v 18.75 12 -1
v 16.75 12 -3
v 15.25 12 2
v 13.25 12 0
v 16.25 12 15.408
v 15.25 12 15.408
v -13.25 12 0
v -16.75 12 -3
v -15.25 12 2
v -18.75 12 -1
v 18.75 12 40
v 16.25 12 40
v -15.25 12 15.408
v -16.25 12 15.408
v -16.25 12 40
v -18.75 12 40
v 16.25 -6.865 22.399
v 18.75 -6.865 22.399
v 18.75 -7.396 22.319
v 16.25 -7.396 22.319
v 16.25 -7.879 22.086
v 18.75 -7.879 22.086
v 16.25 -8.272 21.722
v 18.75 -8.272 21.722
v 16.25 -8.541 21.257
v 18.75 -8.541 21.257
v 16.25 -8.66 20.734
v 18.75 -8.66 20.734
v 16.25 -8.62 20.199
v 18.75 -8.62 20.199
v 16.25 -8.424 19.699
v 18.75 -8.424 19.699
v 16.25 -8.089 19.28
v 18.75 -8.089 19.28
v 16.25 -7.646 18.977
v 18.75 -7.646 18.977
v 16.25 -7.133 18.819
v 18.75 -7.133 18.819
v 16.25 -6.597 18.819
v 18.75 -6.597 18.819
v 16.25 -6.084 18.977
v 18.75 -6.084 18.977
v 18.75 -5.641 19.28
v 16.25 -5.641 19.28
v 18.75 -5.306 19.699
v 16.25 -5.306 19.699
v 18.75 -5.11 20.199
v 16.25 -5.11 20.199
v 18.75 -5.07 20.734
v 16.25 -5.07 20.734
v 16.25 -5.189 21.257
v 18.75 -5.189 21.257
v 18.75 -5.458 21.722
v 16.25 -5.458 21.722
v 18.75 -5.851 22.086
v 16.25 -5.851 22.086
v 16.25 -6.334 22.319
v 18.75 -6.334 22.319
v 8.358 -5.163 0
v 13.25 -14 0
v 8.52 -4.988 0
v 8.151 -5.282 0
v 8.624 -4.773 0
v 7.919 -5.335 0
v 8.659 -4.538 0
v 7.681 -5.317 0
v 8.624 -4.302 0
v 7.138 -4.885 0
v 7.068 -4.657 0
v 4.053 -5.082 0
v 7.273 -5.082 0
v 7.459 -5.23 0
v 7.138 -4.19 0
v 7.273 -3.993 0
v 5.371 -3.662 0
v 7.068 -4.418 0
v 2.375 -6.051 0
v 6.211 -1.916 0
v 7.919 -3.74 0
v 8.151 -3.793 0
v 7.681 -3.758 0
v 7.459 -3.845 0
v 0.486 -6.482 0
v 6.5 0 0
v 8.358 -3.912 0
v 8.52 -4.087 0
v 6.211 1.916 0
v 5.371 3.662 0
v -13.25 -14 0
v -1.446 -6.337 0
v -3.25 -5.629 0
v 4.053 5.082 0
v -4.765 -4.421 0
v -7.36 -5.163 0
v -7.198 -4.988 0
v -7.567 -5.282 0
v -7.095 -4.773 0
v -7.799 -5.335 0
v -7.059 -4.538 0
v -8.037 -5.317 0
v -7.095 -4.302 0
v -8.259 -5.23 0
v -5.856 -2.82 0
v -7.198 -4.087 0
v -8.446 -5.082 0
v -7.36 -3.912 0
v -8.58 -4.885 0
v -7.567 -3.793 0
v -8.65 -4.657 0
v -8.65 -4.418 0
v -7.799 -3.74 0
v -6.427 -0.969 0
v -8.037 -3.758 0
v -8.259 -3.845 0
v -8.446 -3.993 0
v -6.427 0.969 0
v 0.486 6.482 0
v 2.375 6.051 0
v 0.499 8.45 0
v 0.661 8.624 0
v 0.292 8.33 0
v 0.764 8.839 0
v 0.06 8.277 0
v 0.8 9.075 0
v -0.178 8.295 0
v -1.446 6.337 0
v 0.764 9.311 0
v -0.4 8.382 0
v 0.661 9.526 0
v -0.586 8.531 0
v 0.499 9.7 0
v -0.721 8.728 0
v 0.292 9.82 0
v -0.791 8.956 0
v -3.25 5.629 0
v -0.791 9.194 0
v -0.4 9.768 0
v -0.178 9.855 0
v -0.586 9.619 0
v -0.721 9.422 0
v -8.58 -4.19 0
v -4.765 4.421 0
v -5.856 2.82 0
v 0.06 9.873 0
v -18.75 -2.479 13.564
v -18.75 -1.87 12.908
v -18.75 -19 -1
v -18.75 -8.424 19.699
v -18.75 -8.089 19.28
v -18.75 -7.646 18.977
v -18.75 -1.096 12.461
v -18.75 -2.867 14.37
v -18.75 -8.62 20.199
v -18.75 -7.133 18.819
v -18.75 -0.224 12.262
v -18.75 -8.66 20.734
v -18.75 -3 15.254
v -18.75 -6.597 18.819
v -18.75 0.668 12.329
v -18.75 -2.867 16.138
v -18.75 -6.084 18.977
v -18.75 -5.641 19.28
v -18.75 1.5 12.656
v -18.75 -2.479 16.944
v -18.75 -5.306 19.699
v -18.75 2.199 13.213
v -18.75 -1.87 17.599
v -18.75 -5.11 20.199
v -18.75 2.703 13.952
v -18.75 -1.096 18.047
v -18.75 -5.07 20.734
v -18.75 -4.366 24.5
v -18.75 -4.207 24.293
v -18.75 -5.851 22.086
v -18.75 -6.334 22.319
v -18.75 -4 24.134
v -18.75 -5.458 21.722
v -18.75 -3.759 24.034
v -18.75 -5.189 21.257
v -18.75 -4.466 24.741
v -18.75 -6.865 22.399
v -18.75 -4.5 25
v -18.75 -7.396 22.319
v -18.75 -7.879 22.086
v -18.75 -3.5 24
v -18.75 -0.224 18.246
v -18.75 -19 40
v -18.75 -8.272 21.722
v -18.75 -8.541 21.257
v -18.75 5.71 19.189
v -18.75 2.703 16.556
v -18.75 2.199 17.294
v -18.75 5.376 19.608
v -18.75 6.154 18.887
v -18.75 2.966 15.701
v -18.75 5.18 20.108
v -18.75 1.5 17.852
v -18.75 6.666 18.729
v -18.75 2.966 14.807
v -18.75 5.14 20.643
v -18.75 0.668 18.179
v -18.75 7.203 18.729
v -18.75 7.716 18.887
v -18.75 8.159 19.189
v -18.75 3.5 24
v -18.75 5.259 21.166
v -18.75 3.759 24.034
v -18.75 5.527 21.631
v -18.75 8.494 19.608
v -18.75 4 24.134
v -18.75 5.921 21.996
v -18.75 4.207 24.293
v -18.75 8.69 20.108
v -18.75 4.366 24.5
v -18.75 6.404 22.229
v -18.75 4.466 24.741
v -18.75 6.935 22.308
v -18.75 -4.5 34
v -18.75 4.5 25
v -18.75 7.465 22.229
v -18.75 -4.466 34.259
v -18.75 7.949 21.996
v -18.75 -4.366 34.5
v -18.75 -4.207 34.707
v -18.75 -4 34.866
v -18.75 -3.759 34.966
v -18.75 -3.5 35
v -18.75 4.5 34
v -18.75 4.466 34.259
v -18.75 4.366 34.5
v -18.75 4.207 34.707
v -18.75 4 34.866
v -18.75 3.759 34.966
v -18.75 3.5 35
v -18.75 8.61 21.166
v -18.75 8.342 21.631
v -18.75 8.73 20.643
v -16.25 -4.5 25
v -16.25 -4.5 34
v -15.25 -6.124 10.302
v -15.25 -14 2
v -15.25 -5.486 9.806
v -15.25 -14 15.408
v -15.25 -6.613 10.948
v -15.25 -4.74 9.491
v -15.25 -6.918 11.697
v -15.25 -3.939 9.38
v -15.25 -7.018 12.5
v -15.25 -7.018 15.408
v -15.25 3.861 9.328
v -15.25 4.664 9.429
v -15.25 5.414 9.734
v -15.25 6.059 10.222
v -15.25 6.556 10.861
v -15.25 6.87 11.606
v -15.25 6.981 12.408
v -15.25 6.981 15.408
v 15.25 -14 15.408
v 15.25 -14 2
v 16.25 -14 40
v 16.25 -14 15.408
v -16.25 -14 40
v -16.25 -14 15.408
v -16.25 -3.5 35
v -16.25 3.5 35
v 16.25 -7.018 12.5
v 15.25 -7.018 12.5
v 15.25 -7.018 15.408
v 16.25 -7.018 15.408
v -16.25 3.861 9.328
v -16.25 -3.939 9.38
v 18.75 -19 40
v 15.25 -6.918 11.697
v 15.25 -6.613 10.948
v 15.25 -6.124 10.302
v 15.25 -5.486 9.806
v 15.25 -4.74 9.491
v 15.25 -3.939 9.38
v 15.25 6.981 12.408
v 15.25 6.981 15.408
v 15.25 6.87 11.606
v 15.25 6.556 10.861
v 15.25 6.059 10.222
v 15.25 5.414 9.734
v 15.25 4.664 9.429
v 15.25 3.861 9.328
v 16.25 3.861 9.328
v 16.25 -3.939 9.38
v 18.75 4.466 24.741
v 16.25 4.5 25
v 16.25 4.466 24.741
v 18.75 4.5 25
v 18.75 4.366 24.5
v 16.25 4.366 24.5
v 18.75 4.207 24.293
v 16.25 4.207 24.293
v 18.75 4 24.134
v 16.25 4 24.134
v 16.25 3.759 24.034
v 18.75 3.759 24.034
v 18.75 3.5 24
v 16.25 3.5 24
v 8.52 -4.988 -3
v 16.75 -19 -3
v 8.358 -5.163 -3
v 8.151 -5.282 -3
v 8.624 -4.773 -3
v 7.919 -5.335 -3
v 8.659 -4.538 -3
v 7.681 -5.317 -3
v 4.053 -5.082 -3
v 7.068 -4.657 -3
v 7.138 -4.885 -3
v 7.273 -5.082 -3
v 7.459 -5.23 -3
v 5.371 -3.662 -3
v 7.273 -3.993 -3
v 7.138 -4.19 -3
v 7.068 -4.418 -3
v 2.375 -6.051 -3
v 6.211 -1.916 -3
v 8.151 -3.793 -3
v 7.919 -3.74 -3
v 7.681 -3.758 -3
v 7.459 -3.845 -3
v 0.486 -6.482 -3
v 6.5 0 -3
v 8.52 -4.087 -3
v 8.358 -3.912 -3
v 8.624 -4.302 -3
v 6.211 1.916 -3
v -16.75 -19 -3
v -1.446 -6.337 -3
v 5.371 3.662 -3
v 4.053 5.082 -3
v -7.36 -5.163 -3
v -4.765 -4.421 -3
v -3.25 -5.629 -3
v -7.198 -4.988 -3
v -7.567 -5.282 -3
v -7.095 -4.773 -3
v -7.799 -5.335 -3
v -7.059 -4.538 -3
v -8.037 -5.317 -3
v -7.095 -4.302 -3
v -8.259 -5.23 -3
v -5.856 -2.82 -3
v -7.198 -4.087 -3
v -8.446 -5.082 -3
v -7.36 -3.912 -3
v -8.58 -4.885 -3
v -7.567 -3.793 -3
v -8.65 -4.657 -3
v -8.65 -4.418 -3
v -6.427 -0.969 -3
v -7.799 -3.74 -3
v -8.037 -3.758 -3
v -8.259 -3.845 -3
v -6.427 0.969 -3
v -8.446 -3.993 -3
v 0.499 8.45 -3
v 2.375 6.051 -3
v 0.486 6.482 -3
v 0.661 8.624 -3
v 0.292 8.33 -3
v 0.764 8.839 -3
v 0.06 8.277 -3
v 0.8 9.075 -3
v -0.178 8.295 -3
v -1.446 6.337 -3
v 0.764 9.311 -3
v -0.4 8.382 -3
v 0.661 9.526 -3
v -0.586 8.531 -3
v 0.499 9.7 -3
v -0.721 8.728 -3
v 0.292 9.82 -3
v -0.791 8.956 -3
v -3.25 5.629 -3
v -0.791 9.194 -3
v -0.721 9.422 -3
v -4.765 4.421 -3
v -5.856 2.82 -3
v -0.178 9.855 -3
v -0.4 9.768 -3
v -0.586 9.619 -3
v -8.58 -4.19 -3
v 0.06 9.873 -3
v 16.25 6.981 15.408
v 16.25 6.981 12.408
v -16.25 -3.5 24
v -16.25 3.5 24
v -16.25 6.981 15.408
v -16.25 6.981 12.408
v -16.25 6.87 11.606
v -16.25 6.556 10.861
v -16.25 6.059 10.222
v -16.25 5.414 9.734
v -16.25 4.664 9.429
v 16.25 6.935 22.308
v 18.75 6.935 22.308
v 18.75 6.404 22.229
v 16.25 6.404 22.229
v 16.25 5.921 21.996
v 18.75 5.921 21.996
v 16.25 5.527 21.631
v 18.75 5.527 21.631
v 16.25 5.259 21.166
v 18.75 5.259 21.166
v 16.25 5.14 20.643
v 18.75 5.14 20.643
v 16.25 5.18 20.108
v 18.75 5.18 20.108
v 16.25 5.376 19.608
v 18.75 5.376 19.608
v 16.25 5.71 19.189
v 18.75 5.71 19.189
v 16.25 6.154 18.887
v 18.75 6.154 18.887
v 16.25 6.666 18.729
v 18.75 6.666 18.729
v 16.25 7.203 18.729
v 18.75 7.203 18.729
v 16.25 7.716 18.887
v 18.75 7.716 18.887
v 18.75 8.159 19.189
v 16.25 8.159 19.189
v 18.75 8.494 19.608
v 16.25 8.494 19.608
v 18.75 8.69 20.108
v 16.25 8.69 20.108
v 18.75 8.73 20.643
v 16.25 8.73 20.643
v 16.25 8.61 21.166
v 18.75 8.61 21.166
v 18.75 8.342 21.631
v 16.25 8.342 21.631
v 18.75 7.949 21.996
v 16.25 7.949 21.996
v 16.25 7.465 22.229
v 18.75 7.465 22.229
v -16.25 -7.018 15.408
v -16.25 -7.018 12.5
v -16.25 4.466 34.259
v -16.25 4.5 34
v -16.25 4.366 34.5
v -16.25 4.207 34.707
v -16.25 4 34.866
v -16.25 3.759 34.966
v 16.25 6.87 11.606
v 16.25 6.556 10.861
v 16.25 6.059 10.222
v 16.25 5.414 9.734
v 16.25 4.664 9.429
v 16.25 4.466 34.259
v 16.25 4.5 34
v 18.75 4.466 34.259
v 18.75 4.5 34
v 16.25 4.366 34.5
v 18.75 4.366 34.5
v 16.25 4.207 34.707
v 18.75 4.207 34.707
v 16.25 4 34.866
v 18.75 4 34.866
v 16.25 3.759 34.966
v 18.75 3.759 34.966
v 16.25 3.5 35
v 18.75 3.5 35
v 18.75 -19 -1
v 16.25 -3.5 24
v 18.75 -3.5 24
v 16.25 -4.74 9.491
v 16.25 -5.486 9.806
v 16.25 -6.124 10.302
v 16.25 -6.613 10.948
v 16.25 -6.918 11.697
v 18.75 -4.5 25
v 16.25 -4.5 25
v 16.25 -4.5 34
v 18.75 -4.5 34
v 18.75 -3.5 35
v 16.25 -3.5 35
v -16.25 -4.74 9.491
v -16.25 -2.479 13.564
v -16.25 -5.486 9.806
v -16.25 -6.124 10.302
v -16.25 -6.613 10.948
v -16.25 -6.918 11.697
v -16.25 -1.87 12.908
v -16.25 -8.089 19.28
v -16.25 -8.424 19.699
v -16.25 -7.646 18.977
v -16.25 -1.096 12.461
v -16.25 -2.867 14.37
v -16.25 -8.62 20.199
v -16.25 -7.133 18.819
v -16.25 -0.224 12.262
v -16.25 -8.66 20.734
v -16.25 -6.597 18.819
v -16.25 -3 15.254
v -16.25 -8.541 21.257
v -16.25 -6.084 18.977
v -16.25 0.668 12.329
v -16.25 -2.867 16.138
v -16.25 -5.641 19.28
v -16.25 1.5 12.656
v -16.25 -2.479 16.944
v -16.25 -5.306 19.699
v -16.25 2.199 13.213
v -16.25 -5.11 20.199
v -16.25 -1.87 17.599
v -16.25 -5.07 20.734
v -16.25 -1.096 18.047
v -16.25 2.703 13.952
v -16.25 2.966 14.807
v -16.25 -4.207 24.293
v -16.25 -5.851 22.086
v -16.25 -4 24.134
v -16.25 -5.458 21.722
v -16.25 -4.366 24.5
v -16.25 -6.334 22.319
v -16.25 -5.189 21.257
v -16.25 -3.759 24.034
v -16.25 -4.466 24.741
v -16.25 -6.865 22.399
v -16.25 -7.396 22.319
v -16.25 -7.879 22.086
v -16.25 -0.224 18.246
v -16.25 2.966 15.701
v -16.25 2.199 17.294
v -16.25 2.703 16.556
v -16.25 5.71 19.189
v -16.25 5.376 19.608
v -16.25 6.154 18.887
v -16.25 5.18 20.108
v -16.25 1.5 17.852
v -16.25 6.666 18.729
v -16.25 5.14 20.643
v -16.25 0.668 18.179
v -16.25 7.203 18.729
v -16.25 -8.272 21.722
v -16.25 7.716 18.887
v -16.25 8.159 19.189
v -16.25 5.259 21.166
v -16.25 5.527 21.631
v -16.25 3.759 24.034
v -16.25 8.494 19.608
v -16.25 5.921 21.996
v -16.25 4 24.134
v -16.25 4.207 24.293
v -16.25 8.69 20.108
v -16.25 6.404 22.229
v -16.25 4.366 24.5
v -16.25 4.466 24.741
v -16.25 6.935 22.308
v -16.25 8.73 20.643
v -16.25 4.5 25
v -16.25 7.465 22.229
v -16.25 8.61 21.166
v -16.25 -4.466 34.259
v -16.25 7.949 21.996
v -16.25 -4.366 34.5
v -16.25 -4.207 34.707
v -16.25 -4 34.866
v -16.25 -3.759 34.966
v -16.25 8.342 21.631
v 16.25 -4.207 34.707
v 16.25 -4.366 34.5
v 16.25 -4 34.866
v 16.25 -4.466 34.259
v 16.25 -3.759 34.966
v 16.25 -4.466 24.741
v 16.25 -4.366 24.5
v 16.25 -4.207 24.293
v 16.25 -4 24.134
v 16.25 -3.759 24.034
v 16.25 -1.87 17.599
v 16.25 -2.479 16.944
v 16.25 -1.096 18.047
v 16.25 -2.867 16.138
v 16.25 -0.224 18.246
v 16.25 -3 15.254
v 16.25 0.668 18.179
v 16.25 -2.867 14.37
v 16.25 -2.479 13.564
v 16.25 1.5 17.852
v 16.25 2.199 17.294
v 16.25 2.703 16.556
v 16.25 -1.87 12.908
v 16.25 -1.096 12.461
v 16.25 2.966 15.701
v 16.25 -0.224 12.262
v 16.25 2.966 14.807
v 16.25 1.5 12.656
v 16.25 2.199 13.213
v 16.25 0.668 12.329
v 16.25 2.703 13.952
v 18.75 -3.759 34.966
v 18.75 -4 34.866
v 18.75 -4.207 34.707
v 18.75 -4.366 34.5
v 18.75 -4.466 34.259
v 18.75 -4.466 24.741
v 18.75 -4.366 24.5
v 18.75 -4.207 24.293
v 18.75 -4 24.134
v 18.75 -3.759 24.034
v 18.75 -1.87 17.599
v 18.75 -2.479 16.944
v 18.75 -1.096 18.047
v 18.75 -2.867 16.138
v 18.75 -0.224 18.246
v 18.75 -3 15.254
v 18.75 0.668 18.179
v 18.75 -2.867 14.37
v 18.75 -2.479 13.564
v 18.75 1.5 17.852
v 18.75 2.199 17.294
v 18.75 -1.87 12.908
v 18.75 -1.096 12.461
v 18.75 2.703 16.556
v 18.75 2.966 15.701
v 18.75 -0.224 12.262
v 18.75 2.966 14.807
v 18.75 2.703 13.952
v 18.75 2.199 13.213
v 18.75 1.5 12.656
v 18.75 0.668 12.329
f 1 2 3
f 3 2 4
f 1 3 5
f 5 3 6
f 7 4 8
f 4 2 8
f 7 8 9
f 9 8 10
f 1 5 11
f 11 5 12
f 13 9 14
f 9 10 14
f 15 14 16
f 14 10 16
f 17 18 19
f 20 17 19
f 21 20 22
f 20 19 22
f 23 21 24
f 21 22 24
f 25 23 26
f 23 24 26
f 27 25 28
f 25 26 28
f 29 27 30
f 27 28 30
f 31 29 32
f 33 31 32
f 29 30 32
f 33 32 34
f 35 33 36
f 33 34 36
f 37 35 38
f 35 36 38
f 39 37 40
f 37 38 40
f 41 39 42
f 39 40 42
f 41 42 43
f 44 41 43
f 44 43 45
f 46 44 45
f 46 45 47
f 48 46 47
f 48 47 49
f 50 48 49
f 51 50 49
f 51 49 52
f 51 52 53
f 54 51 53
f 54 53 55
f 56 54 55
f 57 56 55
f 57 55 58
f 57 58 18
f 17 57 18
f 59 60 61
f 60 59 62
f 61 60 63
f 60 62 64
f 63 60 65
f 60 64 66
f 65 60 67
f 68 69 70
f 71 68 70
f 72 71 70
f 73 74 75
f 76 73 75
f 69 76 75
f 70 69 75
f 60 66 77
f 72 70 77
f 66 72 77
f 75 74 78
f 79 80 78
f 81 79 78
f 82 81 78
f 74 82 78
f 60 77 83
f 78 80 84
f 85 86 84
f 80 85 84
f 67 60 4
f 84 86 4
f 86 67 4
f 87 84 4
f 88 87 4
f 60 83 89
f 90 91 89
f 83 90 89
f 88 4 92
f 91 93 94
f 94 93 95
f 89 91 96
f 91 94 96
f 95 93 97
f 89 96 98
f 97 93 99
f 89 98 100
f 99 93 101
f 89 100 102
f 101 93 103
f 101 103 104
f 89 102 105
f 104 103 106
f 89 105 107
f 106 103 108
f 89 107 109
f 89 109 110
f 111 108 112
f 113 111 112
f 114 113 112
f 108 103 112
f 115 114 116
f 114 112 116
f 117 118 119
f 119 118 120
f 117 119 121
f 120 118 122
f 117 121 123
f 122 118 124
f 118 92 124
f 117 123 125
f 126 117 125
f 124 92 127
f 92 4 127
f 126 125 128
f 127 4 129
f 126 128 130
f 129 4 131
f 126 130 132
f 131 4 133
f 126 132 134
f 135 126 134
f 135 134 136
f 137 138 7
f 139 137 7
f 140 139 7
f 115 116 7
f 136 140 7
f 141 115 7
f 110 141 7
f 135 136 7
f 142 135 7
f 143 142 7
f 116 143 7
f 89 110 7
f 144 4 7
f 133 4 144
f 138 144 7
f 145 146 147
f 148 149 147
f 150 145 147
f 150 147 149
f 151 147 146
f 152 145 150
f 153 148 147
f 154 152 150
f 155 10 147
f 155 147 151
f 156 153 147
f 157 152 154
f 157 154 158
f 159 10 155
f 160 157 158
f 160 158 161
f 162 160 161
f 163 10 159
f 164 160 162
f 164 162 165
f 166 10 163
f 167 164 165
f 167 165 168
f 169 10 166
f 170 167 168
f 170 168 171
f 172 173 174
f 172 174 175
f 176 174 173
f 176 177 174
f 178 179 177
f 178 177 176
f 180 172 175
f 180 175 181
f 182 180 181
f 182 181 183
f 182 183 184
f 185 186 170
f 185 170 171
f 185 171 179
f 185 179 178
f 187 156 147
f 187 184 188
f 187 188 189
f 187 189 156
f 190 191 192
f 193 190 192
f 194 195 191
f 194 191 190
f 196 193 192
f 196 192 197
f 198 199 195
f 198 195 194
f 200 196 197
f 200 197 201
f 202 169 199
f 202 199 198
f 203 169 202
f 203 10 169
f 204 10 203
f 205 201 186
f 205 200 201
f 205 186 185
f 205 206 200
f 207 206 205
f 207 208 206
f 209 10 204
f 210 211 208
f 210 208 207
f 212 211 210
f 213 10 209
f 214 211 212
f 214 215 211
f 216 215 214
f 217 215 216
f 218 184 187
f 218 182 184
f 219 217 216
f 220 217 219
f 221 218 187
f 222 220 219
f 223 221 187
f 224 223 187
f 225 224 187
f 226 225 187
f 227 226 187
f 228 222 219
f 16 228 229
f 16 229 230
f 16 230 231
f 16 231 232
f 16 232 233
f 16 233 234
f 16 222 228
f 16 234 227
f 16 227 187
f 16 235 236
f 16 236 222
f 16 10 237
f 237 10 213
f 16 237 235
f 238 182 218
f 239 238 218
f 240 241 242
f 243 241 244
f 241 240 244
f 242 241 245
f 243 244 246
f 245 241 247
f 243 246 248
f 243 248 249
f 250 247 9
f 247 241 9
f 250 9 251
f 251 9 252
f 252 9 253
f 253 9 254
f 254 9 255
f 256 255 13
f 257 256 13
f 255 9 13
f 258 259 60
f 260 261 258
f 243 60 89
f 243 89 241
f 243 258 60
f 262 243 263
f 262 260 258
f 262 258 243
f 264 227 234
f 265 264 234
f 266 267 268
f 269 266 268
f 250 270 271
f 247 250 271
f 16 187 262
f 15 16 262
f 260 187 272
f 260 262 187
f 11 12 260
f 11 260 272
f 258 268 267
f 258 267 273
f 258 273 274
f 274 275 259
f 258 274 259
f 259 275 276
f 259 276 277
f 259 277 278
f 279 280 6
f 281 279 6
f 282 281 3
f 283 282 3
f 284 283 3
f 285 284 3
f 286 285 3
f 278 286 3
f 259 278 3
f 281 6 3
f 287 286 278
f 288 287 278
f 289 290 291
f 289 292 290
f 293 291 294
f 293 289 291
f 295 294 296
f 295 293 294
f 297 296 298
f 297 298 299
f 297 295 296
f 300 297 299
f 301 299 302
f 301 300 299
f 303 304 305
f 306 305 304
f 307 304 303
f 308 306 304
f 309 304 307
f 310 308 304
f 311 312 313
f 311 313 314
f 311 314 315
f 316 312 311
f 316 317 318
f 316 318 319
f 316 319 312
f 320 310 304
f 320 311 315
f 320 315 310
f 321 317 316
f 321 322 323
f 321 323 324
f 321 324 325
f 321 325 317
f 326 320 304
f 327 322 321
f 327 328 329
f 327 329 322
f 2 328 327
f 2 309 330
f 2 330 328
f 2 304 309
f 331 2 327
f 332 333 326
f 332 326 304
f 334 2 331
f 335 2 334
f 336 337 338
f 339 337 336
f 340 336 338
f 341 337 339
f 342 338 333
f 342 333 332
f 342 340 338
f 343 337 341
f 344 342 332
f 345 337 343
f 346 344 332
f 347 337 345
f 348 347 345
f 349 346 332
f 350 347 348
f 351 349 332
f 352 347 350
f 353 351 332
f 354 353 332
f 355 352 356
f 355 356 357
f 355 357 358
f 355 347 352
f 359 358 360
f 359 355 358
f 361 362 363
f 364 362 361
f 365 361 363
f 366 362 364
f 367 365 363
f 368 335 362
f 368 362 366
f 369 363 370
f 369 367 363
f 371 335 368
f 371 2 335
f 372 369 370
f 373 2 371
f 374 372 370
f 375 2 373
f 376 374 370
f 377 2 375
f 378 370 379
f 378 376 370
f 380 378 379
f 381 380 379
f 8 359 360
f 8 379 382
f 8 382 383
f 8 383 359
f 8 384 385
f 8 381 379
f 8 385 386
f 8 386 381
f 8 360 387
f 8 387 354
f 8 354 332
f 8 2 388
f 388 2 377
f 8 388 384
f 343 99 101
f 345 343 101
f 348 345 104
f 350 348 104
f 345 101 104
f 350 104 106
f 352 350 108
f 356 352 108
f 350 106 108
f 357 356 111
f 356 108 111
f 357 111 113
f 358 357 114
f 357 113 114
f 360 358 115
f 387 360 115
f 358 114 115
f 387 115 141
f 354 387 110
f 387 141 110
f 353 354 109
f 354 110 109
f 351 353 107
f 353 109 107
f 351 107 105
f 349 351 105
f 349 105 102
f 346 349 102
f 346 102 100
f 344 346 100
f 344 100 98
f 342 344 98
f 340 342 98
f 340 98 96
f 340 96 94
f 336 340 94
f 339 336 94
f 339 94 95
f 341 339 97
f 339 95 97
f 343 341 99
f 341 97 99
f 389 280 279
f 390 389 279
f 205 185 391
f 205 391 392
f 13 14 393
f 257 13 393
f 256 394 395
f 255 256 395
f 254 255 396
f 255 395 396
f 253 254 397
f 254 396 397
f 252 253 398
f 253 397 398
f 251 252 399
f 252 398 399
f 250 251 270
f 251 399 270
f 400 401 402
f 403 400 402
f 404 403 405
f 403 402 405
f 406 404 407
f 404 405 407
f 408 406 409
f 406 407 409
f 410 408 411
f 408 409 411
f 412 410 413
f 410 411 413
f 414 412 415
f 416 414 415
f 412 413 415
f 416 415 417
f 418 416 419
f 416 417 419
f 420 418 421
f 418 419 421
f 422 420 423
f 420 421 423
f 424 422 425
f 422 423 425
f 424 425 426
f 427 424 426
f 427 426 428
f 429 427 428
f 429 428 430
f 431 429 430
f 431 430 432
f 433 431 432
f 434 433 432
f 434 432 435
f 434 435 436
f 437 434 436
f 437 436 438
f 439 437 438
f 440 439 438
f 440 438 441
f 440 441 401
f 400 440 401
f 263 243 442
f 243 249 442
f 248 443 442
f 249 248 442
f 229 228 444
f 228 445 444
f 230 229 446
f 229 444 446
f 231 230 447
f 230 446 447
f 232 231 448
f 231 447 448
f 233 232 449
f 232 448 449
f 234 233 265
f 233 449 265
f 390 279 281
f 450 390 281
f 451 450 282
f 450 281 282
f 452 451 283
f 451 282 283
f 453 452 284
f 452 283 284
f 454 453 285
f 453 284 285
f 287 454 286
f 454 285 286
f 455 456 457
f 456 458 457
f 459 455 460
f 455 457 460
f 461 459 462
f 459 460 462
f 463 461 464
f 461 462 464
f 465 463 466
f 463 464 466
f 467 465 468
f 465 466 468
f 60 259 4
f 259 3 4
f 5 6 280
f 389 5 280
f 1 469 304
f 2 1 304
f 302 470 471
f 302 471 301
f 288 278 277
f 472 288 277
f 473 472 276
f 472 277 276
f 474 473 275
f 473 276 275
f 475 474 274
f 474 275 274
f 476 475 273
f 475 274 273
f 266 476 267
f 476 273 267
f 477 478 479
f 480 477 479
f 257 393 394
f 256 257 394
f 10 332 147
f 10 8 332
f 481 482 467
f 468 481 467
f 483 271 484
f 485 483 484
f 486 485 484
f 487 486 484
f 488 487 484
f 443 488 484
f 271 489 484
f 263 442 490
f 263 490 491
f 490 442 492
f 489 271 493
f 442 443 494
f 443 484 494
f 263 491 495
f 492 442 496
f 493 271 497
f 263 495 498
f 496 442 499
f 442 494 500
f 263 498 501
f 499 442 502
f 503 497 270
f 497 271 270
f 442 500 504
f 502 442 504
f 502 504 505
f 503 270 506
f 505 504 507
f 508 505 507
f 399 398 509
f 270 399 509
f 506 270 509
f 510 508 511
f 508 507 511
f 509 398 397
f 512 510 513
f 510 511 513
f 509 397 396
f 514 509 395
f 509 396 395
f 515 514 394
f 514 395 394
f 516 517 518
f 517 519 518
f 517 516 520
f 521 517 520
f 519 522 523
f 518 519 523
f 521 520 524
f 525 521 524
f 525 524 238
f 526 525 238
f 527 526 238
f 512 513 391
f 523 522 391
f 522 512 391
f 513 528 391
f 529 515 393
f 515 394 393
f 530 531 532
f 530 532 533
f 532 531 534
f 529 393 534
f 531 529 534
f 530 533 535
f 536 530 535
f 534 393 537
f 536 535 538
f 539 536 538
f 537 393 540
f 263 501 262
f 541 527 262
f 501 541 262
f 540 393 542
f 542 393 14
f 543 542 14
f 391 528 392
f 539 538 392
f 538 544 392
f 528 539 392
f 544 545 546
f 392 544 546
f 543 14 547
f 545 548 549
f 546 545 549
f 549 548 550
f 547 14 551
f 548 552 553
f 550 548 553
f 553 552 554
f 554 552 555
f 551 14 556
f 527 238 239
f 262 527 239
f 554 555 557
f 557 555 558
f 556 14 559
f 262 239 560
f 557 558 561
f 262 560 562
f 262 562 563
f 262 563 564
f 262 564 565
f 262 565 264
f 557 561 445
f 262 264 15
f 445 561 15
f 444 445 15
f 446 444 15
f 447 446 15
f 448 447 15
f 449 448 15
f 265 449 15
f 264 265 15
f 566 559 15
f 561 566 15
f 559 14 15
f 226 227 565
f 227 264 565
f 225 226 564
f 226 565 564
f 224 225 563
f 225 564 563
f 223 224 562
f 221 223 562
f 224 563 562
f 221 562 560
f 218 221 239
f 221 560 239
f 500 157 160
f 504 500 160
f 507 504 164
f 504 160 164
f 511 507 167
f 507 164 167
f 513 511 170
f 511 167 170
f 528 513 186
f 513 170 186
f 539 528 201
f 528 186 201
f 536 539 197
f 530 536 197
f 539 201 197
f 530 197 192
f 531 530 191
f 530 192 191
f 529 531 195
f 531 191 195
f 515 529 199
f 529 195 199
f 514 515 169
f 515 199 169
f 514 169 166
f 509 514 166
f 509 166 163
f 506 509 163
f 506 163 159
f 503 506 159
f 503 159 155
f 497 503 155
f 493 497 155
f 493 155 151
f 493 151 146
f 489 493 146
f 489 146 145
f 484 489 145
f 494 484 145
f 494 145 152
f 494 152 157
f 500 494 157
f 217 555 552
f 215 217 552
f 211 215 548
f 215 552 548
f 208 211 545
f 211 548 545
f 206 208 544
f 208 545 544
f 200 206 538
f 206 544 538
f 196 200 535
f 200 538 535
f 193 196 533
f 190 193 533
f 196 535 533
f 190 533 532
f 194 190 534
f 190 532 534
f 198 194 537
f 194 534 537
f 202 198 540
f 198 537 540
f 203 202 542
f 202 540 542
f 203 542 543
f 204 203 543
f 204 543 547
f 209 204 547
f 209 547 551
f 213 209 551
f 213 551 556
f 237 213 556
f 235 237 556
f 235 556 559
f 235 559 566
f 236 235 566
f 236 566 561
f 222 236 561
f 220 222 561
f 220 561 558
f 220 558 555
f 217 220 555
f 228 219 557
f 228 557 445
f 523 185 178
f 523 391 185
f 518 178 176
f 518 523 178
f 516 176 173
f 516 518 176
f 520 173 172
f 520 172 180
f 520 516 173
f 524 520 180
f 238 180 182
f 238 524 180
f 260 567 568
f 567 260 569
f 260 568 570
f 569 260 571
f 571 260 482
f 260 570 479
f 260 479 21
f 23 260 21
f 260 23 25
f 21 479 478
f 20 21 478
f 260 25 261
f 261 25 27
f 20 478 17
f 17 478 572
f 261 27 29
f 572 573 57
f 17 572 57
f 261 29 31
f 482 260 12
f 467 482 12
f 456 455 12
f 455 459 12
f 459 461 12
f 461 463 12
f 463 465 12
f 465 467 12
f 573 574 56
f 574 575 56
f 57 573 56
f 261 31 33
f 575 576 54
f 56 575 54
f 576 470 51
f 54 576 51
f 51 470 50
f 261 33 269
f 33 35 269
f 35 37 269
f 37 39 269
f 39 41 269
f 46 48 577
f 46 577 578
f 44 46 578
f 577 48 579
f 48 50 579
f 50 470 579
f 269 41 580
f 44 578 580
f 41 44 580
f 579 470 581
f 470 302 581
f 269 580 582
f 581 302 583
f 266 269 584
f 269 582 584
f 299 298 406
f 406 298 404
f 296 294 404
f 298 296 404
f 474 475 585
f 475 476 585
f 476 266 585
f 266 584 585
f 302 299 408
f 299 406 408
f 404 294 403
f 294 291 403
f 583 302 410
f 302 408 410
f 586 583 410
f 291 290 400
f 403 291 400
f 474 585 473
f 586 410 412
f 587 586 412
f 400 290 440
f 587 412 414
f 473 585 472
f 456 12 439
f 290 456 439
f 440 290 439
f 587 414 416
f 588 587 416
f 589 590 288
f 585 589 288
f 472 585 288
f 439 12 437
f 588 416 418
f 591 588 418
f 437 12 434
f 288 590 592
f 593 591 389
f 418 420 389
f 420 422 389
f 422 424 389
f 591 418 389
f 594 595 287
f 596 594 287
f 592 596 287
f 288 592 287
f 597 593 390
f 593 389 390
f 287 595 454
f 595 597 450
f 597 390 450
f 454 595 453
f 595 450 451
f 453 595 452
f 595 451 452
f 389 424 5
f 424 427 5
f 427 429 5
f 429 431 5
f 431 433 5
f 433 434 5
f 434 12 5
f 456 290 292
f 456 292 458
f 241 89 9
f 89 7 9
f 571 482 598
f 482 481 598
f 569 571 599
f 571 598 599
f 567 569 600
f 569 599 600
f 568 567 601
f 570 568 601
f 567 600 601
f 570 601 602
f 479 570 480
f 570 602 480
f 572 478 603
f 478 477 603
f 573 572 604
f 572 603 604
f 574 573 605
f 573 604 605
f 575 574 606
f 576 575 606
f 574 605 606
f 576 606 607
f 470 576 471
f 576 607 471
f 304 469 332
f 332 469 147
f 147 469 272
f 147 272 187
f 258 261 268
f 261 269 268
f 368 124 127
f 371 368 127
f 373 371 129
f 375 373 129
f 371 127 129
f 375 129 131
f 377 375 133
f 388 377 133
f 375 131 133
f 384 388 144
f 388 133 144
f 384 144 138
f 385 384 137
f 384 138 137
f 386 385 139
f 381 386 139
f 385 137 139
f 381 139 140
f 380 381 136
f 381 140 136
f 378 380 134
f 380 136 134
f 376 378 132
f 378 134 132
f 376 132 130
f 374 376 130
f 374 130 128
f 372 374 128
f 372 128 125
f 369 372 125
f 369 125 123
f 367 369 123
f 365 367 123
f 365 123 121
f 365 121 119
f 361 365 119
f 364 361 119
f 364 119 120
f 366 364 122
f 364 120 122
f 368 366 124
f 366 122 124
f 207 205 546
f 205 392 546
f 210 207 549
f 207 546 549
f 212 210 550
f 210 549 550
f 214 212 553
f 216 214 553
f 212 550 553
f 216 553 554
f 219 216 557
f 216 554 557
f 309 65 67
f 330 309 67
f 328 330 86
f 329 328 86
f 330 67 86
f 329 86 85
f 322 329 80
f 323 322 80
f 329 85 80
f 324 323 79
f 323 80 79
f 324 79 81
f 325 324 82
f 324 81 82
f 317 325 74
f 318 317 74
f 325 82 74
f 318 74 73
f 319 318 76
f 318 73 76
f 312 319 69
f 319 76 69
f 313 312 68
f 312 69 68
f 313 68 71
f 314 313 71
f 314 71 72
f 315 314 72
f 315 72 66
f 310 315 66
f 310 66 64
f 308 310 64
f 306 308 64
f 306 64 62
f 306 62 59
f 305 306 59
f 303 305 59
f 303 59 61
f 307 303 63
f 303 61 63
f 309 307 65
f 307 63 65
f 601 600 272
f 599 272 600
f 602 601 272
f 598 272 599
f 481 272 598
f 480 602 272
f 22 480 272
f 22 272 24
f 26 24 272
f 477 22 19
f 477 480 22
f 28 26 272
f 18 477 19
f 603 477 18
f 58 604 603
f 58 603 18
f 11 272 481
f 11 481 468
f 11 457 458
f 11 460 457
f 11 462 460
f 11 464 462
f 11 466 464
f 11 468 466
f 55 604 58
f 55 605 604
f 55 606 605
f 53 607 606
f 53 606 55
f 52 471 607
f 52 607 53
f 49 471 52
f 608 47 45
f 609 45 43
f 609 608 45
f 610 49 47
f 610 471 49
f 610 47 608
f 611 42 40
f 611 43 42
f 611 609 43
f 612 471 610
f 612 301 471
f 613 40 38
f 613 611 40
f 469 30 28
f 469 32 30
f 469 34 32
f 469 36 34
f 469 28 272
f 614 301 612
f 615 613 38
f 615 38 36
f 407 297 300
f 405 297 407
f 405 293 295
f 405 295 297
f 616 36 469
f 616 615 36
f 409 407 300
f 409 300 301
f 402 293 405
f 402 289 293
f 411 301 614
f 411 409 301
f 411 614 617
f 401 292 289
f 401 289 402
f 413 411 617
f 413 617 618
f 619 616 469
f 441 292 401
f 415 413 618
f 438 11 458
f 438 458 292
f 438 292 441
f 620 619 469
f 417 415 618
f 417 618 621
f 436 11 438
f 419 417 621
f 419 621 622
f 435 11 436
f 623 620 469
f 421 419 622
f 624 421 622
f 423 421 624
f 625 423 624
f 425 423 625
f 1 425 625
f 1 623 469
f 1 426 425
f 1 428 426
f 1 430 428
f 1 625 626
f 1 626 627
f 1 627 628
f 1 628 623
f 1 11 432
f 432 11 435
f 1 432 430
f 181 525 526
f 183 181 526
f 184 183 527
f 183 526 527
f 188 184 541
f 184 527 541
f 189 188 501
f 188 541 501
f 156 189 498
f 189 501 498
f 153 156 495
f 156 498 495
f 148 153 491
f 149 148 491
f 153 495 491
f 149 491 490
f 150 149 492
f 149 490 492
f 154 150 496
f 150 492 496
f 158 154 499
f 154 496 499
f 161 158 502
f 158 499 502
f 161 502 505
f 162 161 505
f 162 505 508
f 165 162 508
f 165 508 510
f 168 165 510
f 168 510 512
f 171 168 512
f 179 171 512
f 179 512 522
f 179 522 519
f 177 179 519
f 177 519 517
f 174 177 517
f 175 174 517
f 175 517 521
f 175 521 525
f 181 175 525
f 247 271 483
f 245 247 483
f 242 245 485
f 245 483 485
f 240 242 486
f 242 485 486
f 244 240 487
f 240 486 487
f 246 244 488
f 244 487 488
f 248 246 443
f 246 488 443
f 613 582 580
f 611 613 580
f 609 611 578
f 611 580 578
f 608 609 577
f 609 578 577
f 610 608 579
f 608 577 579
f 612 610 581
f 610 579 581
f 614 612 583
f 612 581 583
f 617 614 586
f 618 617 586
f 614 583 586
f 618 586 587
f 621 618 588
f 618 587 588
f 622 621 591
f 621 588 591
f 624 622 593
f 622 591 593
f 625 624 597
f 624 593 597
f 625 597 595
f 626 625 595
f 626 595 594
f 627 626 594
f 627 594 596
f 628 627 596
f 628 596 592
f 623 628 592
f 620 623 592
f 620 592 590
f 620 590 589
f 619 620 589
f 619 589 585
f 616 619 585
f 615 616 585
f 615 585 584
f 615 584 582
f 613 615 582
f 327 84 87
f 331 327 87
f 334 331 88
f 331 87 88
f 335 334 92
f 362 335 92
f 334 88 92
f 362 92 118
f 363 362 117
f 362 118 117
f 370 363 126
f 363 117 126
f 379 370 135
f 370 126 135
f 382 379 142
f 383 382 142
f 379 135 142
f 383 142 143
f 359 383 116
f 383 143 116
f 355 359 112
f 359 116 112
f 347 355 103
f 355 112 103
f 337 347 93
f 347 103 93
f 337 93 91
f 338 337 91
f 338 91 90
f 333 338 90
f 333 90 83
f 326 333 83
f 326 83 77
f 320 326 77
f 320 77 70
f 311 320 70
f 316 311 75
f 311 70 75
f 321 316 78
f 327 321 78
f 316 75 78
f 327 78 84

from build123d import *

# Parameters (mm, degrees)
SKETCH1_W            = 37.5
SKETCH1_H            = 24
SKETCH1_R            = 0.8
SKETCH1_R_2          = 6.5
BOSS_EXTRUDE1_DEPTH  = 3
SKETCH2_W            = 2.5
SKETCH2_H            = 40
BOSS_EXTRUDE2_DEPTH  = 24
BOSS_EXTRUDE3_DEPTH  = 1
BOSS_EXTRUDE4_START  = 31.5
BOSS_EXTRUDE4_DEPTH  = 1
M3_CLEARANCE_HOLE1_D = 3.6
CHAMFER1_SIZE        = 2
SKETCH7_R            = 3
SKETCH7_W            = 11
SKETCH7_H            = 9
CUT_EXTRUDE1_DEPTH   = 57.127087934
FILLET1_R            = 1
BOSS_EXTRUDE5_DEPTH  = 2
BOSS_EXTRUDE6_DEPTH  = 5


with BuildPart() as part:
    # Sketch1 → Boss-Extrude1 (new body)
    with BuildSketch(Plane.XY):
        Rectangle(SKETCH1_W, SKETCH1_H)
        with Locations((0, 9.075)):
            Circle(SKETCH1_R, mode=Mode.SUBTRACT)
        with Locations((7.859180539, -4.5375)):
            Circle(SKETCH1_R, mode=Mode.SUBTRACT)
        with Locations((-7.859180539, -4.5375)):
            Circle(SKETCH1_R, mode=Mode.SUBTRACT)
        Circle(SKETCH1_R_2, mode=Mode.SUBTRACT)
    extrude(amount=-BOSS_EXTRUDE1_DEPTH)

    # Sketch2 → Boss-Extrude2 (add)
    with BuildSketch(Plane(origin=(0, 12, 0), x_dir=(1, 0, 0), z_dir=(0, 1, 0))):
        with Locations((-17.5, -20)):
            Rectangle(SKETCH2_W, SKETCH2_H)
        with Locations((17.5, -20)):
            Rectangle(SKETCH2_W, SKETCH2_H)
    extrude(amount=-BOSS_EXTRUDE2_DEPTH)

    # Sketch4 → Boss-Extrude3 (add)
    with BuildSketch(Plane(origin=(-16.25, 0, 0), x_dir=(0, 0, -1), z_dir=(1, 0, 0))):
        with BuildLine():
            Line((-9.328443352, 3.861127794), (-9.37974654, -3.938739946))
            ThreePointArc((-9.37974654, -3.938739946), (-10.302425145, -6.124404492), (-12.500032536, -7.018265261))
            Line((-12.500032536, -7.018265261), (-15.407950321, -7.018265261))
            Line((-15.407950321, -7.018265261), (-15.407950321, -12))
            Line((-15.407950321, -12), (0, -12))
            Line((0, -12), (0, 12))
            Line((0, 12), (-15.407950321, 12))
            Line((-15.407950321, 12), (-15.407950321, 6.981431896))
            Line((-15.407950321, 6.981431896), (-12.407950321, 6.981431896))
            ThreePointArc((-12.407950321, 6.981431896), (-10.222291202, 6.058740436), (-9.328443352, 3.861127794))
        make_face()
    extrude(amount=BOSS_EXTRUDE3_DEPTH)

    # Sketch4<2> → Boss-Extrude4 (add)
    with BuildSketch(Plane(origin=(-16.25, 0, 0), x_dir=(0, 0, -1), z_dir=(1, 0, 0)).offset(BOSS_EXTRUDE4_START)):
        with BuildLine():
            Line((-9.328443352, 3.861127794), (-9.37974654, -3.938739946))
            ThreePointArc((-9.37974654, -3.938739946), (-10.302425145, -6.124404492), (-12.500032536, -7.018265261))
            Line((-12.500032536, -7.018265261), (-15.407950321, -7.018265261))
            Line((-15.407950321, -7.018265261), (-15.407950321, -12))
            Line((-15.407950321, -12), (0, -12))
            Line((0, -12), (0, 12))
            Line((0, 12), (-15.407950321, 12))
            Line((-15.407950321, 12), (-15.407950321, 6.981431896))
            Line((-15.407950321, 6.981431896), (-12.407950321, 6.981431896))
            ThreePointArc((-12.407950321, 6.981431896), (-10.222291202, 6.058740436), (-9.328443352, 3.861127794))
        make_face()
    extrude(amount=BOSS_EXTRUDE4_DEPTH)

    # M3 Clearance Hole1 (through all)
    with Locations(Plane(origin=(-18.75, 0, 0), x_dir=(0, 0, -1), z_dir=(-1, 0, 0))):
        with Locations((-20.599236057, 6.864991053), (-20.508469302, -6.934710444)):
            Hole(M3_CLEARANCE_HOLE1_D / 2)

    # Chamfer1
    chamfer1_edges = [part.edges().sort_by_distance(p)[0] for p in [
        (18.75, 0, -3),
        (-18.75, 0, -3),
        (-15.25, 0, 0),
        (15.25, 0, 0),
    ]]
    chamfer(chamfer1_edges, length=CHAMFER1_SIZE)

    # Sketch7 → Cut-Extrude1 (cut, through all)
    with BuildSketch(Plane.ZY.offset(18.75)):
        with Locations(Location((15.253967317, 7.63e-07, 0), (0, 0, 270))):
            Circle(SKETCH7_R)
        with Locations((29.5, 0)):
            Rectangle(SKETCH7_W, SKETCH7_H)
    extrude(amount=-CUT_EXTRUDE1_DEPTH, mode=Mode.SUBTRACT)

    # Fillet1
    fillet1_edges = [part.edges().sort_by_distance(p)[0] for p in [
        (-17.5, -4.5, 24),
        (-17.5, 4.5, 24),
        (-17.5, 4.5, 35),
        (-17.5, -4.5, 35),
        (17.5, -4.5, 24),
        (17.5, 4.5, 24),
        (17.5, 4.5, 35),
        (17.5, -4.5, 35),
    ]]
    fillet(fillet1_edges, radius=FILLET1_R)

    # Sketch8 → Boss-Extrude5 (add)
    with BuildSketch(Plane.XZ.offset(12)):
        Polygon((-16.75, -3), (16.75, -3), (18.75, -1), (18.75, 40), (16.25, 40), (16.25, 15.407950321), (15.25, 15.407950321), (15.25, 2), (13.25, 0), (-13.25, 0), (-15.25, 2), (-15.25, 15.407950321), (-16.25, 15.407950321), (-16.25, 40), (-18.75, 40), (-18.75, -1), align=None)
    extrude(amount=BOSS_EXTRUDE5_DEPTH)

    # Sketch9 → Boss-Extrude6 (add)
    with BuildSketch(Plane.XZ.offset(14)):
        Polygon((-18.75, 40), (18.75, 40), (18.75, -1), (16.75, -3), (-16.75, -3), (-18.75, -1), align=None)
    extrude(amount=BOSS_EXTRUDE6_DEPTH)


solid = part.part
